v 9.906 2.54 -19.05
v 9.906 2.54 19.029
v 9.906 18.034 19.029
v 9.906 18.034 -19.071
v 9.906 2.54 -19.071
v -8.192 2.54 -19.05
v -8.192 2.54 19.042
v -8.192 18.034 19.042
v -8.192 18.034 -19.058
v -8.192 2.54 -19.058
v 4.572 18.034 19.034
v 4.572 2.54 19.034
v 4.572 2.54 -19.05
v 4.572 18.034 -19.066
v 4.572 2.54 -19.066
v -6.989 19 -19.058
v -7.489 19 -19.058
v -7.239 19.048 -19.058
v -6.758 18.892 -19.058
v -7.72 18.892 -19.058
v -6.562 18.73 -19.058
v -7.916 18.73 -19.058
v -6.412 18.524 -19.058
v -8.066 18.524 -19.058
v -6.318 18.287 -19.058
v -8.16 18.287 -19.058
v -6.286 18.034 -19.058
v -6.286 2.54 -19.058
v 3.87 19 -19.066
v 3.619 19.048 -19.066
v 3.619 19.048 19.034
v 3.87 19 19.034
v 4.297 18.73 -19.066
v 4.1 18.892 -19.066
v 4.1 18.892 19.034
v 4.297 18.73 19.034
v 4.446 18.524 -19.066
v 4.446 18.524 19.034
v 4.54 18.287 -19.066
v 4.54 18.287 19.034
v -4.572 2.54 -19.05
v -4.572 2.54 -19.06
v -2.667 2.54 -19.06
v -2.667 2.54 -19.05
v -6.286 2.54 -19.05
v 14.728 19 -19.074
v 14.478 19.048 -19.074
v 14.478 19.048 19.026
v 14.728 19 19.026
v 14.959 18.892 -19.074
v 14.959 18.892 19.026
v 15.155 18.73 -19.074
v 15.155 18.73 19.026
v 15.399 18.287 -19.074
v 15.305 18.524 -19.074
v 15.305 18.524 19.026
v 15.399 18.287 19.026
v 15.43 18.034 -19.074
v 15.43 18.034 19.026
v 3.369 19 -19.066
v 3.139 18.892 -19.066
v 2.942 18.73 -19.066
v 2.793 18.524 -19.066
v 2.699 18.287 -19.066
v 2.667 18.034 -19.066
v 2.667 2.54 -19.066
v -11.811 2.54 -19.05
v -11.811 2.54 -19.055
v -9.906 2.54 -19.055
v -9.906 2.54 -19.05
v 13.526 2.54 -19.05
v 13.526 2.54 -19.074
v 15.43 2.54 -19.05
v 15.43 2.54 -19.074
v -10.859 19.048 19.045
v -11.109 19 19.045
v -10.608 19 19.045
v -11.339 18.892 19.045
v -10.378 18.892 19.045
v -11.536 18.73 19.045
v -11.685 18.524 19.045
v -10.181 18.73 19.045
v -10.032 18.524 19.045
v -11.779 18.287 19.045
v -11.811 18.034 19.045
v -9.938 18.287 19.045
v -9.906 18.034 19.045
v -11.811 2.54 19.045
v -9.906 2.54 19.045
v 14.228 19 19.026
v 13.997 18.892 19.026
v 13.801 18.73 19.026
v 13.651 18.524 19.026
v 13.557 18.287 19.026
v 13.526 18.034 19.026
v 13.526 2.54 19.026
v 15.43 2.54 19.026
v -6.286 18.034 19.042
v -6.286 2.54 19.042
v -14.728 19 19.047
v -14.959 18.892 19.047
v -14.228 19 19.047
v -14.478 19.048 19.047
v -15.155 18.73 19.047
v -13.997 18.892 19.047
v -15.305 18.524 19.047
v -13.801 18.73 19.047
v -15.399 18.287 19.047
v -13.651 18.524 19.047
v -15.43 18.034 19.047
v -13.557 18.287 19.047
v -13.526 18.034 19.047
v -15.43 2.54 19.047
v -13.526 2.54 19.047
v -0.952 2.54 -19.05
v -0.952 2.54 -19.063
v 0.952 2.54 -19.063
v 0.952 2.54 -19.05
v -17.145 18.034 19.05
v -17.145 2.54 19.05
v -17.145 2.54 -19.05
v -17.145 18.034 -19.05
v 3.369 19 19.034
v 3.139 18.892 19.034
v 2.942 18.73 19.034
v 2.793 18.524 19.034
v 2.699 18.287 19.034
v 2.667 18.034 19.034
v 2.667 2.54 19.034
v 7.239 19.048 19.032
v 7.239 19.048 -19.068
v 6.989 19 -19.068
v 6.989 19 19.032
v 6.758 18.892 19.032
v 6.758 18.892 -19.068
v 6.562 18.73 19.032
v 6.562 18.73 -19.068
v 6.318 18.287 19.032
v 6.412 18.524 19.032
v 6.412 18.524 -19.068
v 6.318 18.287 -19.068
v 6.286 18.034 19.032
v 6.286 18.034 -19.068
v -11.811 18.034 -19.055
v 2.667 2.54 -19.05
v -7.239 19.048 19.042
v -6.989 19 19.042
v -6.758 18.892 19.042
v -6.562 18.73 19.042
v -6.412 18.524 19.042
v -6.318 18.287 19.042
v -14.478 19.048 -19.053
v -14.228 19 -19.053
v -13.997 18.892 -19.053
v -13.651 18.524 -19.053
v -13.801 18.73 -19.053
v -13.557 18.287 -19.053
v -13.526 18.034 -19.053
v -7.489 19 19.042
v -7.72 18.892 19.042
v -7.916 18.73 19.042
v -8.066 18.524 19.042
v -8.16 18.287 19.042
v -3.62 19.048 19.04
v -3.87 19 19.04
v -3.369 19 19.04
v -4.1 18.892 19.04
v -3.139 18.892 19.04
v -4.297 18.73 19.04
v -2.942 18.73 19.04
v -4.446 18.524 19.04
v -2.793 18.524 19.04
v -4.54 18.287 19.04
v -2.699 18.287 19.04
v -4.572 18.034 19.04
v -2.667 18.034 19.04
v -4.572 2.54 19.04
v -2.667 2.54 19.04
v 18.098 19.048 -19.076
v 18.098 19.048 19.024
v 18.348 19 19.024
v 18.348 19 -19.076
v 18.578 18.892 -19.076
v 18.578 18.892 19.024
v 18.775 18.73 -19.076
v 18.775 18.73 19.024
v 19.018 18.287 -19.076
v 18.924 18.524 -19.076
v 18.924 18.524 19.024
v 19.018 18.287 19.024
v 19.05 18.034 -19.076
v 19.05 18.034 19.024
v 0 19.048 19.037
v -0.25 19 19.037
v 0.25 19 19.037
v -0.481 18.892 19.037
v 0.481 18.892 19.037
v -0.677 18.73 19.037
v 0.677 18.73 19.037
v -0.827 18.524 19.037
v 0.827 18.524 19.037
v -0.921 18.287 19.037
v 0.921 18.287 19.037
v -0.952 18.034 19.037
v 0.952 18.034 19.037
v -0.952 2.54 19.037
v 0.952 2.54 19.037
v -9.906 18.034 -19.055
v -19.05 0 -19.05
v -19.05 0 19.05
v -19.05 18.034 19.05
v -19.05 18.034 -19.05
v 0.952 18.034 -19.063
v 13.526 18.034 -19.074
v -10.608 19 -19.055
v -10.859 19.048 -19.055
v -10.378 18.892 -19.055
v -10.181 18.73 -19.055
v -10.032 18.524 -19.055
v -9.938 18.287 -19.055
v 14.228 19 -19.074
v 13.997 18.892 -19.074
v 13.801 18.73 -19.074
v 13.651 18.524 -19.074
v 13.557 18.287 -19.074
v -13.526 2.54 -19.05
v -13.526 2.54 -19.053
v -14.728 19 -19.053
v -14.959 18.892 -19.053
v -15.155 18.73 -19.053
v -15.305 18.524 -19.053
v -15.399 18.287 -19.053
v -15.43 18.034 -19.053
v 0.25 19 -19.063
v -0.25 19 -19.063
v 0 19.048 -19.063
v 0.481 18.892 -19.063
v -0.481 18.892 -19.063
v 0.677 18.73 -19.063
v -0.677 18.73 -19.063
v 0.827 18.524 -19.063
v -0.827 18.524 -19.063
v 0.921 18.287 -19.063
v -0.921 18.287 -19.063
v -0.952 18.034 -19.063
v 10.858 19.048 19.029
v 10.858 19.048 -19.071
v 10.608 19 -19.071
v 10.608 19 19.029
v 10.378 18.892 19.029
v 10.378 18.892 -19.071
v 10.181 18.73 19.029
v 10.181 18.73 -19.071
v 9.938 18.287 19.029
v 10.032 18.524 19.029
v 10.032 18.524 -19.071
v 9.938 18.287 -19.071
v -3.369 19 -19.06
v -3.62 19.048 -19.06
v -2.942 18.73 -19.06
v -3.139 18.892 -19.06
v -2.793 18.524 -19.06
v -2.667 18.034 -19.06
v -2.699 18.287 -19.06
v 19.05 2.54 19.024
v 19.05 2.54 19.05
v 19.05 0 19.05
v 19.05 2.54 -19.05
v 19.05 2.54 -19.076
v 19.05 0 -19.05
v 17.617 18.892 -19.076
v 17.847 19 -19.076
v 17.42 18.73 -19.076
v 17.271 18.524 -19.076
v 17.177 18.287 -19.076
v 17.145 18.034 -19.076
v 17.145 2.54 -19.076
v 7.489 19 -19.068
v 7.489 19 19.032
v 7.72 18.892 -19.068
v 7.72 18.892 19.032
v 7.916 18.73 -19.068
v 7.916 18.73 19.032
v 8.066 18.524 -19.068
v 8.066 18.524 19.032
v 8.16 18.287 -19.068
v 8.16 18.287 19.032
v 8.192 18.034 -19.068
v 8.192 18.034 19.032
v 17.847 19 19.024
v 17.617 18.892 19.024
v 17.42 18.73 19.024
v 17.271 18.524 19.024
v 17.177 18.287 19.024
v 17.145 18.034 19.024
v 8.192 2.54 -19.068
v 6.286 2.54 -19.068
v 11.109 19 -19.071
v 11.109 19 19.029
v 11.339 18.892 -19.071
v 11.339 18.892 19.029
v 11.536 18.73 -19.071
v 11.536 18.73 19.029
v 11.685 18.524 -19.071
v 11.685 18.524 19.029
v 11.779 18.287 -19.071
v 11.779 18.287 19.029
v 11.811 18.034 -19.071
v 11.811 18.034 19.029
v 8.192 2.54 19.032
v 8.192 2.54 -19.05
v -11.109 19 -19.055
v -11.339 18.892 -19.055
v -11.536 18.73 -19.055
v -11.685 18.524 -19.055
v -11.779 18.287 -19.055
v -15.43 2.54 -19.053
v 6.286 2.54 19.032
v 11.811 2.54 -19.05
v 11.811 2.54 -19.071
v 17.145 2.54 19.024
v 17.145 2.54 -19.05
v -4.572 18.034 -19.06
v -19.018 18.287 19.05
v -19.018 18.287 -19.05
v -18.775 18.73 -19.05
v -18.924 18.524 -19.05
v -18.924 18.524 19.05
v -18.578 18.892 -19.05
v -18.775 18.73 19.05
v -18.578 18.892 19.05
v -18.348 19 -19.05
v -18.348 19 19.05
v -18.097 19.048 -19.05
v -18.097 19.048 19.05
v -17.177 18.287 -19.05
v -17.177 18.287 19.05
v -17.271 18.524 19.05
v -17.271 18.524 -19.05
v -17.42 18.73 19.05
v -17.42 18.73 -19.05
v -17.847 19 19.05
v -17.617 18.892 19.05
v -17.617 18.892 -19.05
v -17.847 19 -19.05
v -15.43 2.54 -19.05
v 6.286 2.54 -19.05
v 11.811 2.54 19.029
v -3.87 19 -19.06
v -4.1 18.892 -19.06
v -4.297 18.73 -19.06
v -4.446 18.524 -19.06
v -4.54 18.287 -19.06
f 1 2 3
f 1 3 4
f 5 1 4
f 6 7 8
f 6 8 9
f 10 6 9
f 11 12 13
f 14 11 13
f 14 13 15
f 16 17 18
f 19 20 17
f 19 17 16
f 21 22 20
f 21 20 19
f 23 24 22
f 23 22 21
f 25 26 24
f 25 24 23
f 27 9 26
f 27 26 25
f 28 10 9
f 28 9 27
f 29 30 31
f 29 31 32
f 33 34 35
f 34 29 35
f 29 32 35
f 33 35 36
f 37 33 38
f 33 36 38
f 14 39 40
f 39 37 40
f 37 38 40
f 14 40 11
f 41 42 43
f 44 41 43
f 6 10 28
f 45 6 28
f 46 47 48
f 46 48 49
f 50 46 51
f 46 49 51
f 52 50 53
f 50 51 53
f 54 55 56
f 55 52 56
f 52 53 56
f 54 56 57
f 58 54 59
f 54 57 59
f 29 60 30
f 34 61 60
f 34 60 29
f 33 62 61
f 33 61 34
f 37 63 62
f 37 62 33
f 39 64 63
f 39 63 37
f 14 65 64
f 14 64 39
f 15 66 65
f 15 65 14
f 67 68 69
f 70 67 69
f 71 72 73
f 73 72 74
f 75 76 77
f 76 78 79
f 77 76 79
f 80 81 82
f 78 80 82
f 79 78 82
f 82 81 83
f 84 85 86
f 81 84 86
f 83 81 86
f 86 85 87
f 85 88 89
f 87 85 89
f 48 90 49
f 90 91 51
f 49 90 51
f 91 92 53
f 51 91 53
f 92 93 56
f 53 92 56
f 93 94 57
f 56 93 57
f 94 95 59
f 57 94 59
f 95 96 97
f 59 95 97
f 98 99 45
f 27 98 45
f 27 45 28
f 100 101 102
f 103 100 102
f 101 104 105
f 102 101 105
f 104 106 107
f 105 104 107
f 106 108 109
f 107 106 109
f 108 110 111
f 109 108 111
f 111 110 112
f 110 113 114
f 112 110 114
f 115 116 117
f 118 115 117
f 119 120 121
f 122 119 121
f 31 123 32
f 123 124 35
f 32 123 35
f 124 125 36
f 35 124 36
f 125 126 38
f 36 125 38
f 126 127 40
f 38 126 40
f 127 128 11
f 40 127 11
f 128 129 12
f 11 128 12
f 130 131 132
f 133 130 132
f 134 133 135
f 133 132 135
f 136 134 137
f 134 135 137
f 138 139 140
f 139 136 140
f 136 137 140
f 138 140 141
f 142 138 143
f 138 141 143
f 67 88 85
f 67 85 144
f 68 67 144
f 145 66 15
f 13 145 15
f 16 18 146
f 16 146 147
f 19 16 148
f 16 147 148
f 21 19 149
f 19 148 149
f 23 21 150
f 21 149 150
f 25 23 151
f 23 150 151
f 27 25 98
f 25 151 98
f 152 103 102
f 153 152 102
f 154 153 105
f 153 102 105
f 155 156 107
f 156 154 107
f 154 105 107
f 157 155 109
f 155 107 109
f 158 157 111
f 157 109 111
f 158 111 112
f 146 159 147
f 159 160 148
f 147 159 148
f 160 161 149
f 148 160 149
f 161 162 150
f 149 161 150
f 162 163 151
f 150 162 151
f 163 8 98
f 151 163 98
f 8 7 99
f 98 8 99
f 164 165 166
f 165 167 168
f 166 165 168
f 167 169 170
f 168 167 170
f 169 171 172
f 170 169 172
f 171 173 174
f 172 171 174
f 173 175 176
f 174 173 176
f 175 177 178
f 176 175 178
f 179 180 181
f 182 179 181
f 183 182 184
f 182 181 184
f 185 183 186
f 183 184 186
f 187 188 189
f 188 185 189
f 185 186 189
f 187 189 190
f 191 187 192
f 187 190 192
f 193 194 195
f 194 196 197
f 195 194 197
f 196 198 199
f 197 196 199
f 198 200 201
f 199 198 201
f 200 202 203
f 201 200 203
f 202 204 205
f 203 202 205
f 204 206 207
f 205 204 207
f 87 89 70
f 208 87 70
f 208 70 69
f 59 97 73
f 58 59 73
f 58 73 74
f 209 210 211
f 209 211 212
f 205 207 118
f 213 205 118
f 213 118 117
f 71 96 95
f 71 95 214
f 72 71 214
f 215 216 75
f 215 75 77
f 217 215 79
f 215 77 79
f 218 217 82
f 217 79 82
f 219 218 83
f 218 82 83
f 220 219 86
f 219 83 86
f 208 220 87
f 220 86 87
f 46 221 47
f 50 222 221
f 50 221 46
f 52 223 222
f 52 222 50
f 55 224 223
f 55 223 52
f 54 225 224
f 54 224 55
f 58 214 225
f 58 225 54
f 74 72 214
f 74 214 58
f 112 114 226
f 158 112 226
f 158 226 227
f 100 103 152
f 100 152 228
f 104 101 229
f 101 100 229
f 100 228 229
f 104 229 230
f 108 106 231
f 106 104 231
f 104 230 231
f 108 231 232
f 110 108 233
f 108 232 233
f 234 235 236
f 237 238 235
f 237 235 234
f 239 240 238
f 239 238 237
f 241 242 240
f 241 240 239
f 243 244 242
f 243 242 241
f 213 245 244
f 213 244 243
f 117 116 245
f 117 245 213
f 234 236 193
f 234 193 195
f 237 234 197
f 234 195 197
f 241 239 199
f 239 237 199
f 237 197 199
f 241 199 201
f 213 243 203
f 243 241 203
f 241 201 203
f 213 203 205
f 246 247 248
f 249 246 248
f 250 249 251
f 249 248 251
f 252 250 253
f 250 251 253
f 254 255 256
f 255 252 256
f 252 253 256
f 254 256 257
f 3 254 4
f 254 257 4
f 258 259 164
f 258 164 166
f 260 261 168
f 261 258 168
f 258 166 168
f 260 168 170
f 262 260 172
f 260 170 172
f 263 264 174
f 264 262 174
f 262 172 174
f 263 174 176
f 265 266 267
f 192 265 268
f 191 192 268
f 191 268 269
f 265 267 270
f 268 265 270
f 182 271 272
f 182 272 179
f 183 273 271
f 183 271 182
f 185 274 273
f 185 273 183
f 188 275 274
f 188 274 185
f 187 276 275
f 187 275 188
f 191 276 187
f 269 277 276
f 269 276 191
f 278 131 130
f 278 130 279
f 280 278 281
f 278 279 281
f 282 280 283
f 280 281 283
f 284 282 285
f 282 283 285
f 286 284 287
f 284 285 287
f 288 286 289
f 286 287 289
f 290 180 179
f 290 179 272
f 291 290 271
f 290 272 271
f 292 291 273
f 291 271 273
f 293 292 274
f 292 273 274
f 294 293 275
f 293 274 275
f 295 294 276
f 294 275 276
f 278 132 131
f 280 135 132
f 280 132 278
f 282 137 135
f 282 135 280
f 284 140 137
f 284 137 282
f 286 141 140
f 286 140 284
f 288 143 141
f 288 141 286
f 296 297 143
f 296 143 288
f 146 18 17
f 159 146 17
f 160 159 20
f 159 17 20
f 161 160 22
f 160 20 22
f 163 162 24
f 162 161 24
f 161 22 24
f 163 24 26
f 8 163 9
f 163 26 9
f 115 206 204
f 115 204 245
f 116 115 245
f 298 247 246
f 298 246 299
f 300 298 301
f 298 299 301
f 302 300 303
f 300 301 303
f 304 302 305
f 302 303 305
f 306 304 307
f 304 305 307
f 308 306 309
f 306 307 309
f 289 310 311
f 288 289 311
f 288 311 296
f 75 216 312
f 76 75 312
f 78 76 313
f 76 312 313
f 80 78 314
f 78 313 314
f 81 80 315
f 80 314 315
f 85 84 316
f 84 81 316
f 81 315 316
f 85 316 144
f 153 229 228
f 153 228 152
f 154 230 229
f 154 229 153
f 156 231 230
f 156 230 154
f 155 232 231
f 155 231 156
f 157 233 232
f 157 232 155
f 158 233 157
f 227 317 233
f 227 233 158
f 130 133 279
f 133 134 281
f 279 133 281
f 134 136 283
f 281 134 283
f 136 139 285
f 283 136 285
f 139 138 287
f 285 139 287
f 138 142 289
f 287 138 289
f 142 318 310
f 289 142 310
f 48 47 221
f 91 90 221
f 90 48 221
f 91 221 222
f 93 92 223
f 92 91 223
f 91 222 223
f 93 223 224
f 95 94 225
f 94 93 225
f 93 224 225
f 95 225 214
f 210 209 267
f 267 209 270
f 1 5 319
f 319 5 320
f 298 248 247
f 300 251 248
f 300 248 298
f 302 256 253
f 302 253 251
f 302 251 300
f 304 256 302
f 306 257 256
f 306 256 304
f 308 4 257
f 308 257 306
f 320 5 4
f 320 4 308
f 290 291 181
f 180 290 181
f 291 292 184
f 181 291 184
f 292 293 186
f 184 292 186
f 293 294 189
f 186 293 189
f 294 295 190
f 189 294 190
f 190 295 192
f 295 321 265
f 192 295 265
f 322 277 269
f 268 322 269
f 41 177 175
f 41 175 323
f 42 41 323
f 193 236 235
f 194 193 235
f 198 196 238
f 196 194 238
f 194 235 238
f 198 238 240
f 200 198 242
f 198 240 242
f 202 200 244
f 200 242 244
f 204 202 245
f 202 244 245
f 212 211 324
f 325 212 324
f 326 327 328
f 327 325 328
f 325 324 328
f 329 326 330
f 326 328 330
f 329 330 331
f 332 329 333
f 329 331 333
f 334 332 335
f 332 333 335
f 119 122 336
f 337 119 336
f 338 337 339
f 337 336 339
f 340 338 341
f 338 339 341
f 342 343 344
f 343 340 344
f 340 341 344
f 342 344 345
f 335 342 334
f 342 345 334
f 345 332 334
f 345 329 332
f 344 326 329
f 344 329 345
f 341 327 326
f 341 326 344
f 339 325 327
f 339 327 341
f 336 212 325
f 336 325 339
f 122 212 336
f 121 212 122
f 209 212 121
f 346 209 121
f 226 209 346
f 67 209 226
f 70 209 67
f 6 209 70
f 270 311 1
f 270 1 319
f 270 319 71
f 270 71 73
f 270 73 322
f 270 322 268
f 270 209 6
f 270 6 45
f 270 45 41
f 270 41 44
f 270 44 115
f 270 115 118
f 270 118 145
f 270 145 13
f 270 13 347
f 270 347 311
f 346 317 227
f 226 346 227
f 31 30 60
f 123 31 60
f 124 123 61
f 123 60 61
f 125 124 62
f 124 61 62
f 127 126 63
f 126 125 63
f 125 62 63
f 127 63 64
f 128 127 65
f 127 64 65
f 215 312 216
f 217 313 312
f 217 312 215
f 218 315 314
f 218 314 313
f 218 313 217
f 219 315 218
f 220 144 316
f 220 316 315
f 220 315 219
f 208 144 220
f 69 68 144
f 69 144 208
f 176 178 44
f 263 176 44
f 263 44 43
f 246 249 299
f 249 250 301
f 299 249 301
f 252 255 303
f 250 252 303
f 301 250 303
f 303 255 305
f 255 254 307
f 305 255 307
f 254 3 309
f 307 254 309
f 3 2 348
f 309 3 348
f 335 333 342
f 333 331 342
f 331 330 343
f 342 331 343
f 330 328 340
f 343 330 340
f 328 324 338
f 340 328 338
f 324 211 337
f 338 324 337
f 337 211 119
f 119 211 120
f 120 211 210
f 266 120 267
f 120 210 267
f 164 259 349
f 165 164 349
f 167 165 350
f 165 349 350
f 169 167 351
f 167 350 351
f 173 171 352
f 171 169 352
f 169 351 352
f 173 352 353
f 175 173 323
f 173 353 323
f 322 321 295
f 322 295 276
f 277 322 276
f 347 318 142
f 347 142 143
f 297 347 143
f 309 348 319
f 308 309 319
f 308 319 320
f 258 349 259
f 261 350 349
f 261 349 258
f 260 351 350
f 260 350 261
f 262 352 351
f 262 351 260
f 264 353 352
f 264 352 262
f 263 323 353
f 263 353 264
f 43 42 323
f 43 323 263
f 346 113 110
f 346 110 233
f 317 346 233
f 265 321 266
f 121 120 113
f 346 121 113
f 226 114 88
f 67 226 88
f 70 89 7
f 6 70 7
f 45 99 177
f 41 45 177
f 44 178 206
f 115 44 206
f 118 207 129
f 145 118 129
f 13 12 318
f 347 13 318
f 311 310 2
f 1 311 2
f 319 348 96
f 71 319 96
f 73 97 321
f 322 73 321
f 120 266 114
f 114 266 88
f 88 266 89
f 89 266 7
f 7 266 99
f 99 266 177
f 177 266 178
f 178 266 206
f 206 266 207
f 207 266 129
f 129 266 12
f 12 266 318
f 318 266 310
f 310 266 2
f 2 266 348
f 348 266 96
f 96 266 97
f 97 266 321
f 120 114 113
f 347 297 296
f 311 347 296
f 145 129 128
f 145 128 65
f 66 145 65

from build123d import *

# Parameters (mm, degrees)
SKETCH1_W           = 38.1
SKETCH1_H           = 38.1
BOSS_EXTRUDE1_DEPTH = 2.54
SKETCH2_W           = 1.905
SKETCH2_H           = 38.1
BOSS_EXTRUDE2_DEPTH = 16.51
FILLET3_R           = 1.016


with BuildPart() as part:
    # Sketch1 → Boss-Extrude1 (new body)
    with BuildSketch(Plane(origin=(0, 0, 0), x_dir=(1, 0, 0), z_dir=(0, 1, 0))):
        Rectangle(SKETCH1_W, SKETCH1_H)
    extrude(amount=BOSS_EXTRUDE1_DEPTH)

    # Sketch2 → Boss-Extrude2 (add)
    with BuildSketch(Plane(origin=(0, 2.54, 0), x_dir=(1, 0, 0), z_dir=(0, 1, 0))):
        with Locations((-18.0975, 0)):
            Rectangle(SKETCH2_W, SKETCH2_H)
        with Locations((-14.478, 0.002613699)):
            Rectangle(SKETCH2_W, SKETCH2_H)
        with Locations((-10.8585, 0.005227397)):
            Rectangle(SKETCH2_W, SKETCH2_H)
        with Locations((-7.239, 0.007841096)):
            Rectangle(SKETCH2_W, SKETCH2_H)
        with Locations((-3.6195, 0.010454795)):
            Rectangle(SKETCH2_W, SKETCH2_H)
        with Locations((0, 0.013068494)):
            Rectangle(SKETCH2_W, SKETCH2_H)
        with Locations((3.6195, 0.015682192)):
            Rectangle(SKETCH2_W, SKETCH2_H)
        with Locations((7.239, 0.018295891)):
            Rectangle(SKETCH2_W, SKETCH2_H)
        with Locations((10.8585, 0.02090959)):
            Rectangle(SKETCH2_W, SKETCH2_H)
        with Locations((14.478, 0.023523288)):
            Rectangle(SKETCH2_W, SKETCH2_H)
        with Locations((18.0975, 0.026136987)):
            Rectangle(SKETCH2_W, SKETCH2_H)
    extrude(amount=BOSS_EXTRUDE2_DEPTH)

    # Fillet3
    # the kernel refuses this fillet: 1.016 mm, written as the material it takes off along each edge
    with BuildSketch(Plane(origin=(-19.05, 19.05, 21.59), x_dir=(1, 0, 0), z_dir=(0, 0, -1)), Plane(origin=(17.145, 19.05, -21.616136987), x_dir=(0, -1, 0), z_dir=(0, 0, 1)), Plane(origin=(13.5255, 19.05, -21.613523288), x_dir=(0, -1, 0), z_dir=(0, 0, 1)), Plane(origin=(9.906, 19.05, -21.61090959), x_dir=(0, -1, 0), z_dir=(0, 0, 1)), Plane(origin=(6.2865, 19.05, -21.608295891), x_dir=(0, -1, 0), z_dir=(0, 0, 1)), Plane(origin=(2.667, 19.05, -21.605682192), x_dir=(0, -1, 0), z_dir=(0, 0, 1)), Plane(origin=(-0.9525, 19.05, -21.603068494), x_dir=(0, -1, 0), z_dir=(0, 0, 1)), Plane(origin=(-4.572, 19.05, -21.600454795), x_dir=(0, -1, 0), z_dir=(0, 0, 1)), Plane(origin=(-8.1915, 19.05, -21.597841096), x_dir=(0, -1, 0), z_dir=(0, 0, 1)), Plane(origin=(-11.811, 19.05, -21.595227397), x_dir=(0, -1, 0), z_dir=(0, 0, 1)), Plane(origin=(-15.4305, 19.05, -21.592613699), x_dir=(0, -1, 0), z_dir=(0, 0, 1))) as fillet3_piece_1:
        with BuildLine():
            CenterArc((FILLET3_R, FILLET3_R), FILLET3_R, 180, 90)
            Line((0, FILLET3_R), (0, 0))
            Line((0, 0), (FILLET3_R, 0))
        make_face()
    extrude(amount=43.18, mode=Mode.SUBTRACT)
    with BuildSketch(Plane(origin=(-17.145, 19.05, -21.59), x_dir=(0, -1, 0), z_dir=(0, 0, 1)), Plane(origin=(19.05, 19.05, 21.563863013), x_dir=(-1, 0, 0), z_dir=(0, 0, -1)), Plane(origin=(15.4305, 19.05, 21.566476712), x_dir=(-1, 0, 0), z_dir=(0, 0, -1)), Plane(origin=(11.811, 19.05, 21.56909041), x_dir=(-1, 0, 0), z_dir=(0, 0, -1)), Plane(origin=(8.1915, 19.05, 21.571704109), x_dir=(-1, 0, 0), z_dir=(0, 0, -1)), Plane(origin=(4.572, 19.05, 21.574317808), x_dir=(-1, 0, 0), z_dir=(0, 0, -1)), Plane(origin=(0.9525, 19.05, 21.576931506), x_dir=(-1, 0, 0), z_dir=(0, 0, -1)), Plane(origin=(-2.667, 19.05, 21.579545205), x_dir=(-1, 0, 0), z_dir=(0, 0, -1)), Plane(origin=(-6.2865, 19.05, 21.582158904), x_dir=(-1, 0, 0), z_dir=(0, 0, -1)), Plane(origin=(-9.906, 19.05, 21.584772603), x_dir=(-1, 0, 0), z_dir=(0, 0, -1)), Plane(origin=(-13.5255, 19.05, 21.587386301), x_dir=(-1, 0, 0), z_dir=(0, 0, -1))) as fillet3_piece_2:
        with BuildLine():
            CenterArc((FILLET3_R, -FILLET3_R), FILLET3_R, 90, 90)
            Line((0, -FILLET3_R), (0, 0))
            Line((0, 0), (FILLET3_R, 0))
        make_face()
    extrude(amount=43.18, mode=Mode.SUBTRACT)


solid = part.part
